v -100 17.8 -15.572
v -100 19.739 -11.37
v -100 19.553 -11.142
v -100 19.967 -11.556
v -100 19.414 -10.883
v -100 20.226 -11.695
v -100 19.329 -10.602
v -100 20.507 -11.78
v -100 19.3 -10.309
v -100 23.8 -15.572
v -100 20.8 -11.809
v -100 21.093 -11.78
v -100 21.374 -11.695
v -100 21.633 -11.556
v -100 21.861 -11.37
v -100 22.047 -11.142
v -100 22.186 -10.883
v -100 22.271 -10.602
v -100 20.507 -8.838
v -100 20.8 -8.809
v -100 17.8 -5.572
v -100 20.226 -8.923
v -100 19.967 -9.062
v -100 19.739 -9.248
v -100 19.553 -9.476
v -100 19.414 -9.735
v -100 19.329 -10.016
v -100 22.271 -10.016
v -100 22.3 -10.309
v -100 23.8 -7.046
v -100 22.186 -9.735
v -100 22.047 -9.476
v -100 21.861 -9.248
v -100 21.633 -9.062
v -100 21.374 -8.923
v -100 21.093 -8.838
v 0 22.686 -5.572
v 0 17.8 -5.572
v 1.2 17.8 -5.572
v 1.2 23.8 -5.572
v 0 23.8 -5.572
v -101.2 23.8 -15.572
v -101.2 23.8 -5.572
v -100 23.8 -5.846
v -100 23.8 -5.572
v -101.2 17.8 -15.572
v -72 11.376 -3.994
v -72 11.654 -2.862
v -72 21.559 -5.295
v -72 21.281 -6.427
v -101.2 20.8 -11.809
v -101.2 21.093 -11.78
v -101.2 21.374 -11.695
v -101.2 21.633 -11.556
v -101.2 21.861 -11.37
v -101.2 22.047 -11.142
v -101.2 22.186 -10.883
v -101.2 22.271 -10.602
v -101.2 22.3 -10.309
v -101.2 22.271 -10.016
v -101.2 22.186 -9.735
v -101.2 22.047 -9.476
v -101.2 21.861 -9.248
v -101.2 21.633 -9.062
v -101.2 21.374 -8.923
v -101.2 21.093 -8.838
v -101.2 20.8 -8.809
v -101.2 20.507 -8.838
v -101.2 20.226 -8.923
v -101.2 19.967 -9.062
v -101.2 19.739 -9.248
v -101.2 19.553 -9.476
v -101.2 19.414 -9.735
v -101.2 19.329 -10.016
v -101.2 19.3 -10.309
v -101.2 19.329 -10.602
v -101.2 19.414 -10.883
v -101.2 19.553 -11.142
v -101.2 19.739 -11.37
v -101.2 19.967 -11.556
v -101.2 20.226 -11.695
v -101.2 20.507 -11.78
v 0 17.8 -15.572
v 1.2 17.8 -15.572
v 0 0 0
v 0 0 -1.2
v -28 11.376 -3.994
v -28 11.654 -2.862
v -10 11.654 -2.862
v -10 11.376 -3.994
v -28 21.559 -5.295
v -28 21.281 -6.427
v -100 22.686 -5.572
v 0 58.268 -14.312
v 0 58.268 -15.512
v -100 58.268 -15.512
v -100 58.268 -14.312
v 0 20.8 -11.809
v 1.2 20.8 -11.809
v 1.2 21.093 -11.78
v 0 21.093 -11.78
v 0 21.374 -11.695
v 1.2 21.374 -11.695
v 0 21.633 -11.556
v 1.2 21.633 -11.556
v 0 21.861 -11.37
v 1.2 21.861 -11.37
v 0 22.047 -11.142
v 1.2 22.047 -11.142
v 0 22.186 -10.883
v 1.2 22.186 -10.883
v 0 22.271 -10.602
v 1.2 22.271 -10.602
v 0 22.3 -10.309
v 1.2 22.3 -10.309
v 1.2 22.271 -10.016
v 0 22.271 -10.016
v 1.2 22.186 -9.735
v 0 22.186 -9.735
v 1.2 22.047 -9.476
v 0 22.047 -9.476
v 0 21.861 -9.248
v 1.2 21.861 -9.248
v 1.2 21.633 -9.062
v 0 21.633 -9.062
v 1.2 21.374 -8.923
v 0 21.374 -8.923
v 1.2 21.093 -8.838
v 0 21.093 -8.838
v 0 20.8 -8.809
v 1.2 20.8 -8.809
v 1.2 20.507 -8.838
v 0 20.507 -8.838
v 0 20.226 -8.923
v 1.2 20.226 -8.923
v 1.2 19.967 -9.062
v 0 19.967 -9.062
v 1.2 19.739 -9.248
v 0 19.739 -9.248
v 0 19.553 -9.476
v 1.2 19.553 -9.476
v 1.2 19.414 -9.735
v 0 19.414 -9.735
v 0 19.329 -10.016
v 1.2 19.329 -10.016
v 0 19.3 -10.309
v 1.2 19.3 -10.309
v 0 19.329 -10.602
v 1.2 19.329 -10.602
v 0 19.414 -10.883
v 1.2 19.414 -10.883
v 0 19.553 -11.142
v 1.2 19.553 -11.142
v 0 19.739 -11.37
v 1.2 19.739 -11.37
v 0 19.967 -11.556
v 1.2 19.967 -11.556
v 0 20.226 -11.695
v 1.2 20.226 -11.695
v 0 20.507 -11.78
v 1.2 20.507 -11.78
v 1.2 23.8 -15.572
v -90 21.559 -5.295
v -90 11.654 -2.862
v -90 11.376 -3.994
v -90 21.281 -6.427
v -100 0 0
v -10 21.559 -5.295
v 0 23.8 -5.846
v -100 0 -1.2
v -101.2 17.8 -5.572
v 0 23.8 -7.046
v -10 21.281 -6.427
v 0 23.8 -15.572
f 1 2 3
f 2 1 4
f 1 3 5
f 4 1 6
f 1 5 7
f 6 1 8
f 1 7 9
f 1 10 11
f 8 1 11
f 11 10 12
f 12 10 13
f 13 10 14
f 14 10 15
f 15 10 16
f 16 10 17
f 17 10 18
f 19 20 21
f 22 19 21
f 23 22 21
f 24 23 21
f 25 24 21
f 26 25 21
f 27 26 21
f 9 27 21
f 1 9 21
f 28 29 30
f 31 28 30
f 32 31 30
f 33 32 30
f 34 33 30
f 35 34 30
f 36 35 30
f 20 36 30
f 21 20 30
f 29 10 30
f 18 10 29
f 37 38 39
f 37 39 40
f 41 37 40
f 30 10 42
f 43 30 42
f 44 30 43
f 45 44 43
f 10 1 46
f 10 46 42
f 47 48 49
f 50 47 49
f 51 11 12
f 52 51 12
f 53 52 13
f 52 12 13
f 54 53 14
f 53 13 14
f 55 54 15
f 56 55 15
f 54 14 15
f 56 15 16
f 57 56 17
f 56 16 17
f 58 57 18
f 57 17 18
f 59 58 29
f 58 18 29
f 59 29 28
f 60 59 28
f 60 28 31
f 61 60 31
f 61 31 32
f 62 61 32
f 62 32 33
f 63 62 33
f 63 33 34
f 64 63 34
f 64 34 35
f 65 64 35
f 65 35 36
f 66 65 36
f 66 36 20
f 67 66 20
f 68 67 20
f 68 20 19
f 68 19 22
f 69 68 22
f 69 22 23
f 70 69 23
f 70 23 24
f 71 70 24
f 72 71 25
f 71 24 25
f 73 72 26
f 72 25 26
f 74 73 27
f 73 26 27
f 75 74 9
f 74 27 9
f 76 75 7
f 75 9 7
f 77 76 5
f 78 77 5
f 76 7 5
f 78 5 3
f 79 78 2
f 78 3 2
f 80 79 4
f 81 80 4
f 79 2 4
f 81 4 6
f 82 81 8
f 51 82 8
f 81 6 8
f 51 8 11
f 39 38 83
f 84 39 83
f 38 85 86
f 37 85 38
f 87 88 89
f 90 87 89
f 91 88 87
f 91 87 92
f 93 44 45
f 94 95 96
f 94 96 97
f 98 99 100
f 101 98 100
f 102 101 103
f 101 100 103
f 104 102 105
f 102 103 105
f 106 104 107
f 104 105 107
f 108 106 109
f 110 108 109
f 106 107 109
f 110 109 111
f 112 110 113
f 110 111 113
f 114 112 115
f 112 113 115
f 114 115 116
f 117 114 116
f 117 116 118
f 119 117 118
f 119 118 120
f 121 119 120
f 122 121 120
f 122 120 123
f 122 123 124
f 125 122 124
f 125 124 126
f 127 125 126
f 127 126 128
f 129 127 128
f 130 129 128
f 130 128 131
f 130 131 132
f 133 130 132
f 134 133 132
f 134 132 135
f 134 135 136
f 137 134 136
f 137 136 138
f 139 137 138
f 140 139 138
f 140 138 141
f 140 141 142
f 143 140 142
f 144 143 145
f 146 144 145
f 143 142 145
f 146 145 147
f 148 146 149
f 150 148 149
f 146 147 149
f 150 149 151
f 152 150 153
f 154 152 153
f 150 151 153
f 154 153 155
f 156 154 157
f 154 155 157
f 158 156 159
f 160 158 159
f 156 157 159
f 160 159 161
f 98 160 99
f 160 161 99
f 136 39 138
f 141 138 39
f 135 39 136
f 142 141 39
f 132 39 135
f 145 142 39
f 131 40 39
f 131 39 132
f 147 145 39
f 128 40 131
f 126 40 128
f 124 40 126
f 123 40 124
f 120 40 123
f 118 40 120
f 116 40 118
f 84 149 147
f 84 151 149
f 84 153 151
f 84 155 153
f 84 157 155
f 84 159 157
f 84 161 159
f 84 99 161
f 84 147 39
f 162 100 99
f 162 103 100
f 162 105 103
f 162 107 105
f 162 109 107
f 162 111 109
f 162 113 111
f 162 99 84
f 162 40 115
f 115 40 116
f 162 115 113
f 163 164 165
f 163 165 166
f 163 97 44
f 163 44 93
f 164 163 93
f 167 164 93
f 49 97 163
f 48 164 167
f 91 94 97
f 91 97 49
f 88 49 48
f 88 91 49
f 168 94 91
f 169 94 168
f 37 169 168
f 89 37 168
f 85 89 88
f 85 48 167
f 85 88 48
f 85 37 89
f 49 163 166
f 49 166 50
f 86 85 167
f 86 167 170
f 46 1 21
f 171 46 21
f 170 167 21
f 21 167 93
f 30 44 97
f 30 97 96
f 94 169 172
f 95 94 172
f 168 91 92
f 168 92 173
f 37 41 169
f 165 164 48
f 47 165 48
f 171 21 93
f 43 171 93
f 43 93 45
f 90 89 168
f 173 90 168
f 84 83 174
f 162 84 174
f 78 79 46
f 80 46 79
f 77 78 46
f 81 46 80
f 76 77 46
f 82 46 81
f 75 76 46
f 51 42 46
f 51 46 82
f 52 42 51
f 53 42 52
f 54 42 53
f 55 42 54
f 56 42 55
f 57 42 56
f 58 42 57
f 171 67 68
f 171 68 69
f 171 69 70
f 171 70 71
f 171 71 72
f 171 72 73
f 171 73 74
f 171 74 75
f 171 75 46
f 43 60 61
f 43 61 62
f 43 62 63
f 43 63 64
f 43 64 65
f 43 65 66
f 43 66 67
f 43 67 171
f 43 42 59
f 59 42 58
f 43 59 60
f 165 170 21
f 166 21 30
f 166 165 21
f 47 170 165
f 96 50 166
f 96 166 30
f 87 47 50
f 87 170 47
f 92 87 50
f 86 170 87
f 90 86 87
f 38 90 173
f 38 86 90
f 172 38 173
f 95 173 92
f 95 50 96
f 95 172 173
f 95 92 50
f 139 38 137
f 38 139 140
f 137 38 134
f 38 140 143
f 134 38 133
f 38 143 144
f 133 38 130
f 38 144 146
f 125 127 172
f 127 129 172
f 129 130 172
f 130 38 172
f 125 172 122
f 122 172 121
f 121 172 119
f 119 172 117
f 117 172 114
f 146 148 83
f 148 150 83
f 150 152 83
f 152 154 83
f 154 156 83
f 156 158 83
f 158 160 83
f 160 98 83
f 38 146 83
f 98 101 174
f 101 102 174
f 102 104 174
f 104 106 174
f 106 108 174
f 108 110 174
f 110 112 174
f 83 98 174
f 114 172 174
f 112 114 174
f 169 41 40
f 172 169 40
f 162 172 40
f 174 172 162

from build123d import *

# Parameters (mm, degrees)
SALIENTE_EXTRUIR1_DEPTH = 100
CROQUIS3_W              = 10
CROQUIS3_H              = 6
SALIENTE_EXTRUIR2_DEPTH = 1.2
CROQUIS4_W              = 10
CROQUIS4_H              = 6
SALIENTE_EXTRUIR3_DEPTH = 1.2
CROQUIS5_R              = 1.5
CORTAR_EXTRUIR1_DEPTH   = 119.841982146
CROQUIS6_W              = 18
CROQUIS6_H              = 10.2
CORTAR_EXTRUIR2_DEPTH   = 14


with BuildPart() as part:
    # Croquis1 → Saliente-Extruir1 (new body)
    with BuildSketch(Plane(origin=(0, 0, 0), x_dir=(0, 0, -1), z_dir=(1, 0, 0))):
        Polygon((0, 0), (1.2, 0), (15.512007455, 58.268056795), (14.312007455, 58.268056795), align=None)
    extrude(amount=-SALIENTE_EXTRUIR1_DEPTH)

    # Croquis3 → Saliente-Extruir2 (add)
    with BuildSketch(Plane(origin=(0, 0, 0), x_dir=(0, 0, -1), z_dir=(1, 0, 0))):
        with Locations((10.572099341, 20.8)):
            Rectangle(CROQUIS3_W, CROQUIS3_H)
    extrude(amount=SALIENTE_EXTRUIR2_DEPTH)

    # Croquis4 → Saliente-Extruir3 (add)
    with BuildSketch(Plane.ZY.offset(100)):
        with Locations((-10.572099341, 20.8)):
            Rectangle(CROQUIS4_W, CROQUIS4_H)
    extrude(amount=SALIENTE_EXTRUIR3_DEPTH)

    # Croquis5 → Cortar-Extruir1 (cut, through all)
    with BuildSketch(Plane(origin=(1.2, 0, 0), x_dir=(0, 0, -1), z_dir=(1, 0, 0))):
        with Locations((10.308970016, 20.8)):
            Circle(CROQUIS5_R)
    extrude(amount=-CORTAR_EXTRUIR1_DEPTH, mode=Mode.SUBTRACT)

    # Croquis6 → Cortar-Extruir2 (cut)
    with BuildSketch(Plane(origin=(0, 0, 0), x_dir=(1, 0, 0), z_dir=(0, 0.2385334575785815, 0.971134279909636))):
        with Locations((-81, 17.1)):
            Rectangle(CROQUIS6_W, CROQUIS6_H)
        with Locations((-19, 17.1)):
            Rectangle(CROQUIS6_W, CROQUIS6_H)
    extrude(amount=-CORTAR_EXTRUIR2_DEPTH, mode=Mode.SUBTRACT)


solid = part.part
